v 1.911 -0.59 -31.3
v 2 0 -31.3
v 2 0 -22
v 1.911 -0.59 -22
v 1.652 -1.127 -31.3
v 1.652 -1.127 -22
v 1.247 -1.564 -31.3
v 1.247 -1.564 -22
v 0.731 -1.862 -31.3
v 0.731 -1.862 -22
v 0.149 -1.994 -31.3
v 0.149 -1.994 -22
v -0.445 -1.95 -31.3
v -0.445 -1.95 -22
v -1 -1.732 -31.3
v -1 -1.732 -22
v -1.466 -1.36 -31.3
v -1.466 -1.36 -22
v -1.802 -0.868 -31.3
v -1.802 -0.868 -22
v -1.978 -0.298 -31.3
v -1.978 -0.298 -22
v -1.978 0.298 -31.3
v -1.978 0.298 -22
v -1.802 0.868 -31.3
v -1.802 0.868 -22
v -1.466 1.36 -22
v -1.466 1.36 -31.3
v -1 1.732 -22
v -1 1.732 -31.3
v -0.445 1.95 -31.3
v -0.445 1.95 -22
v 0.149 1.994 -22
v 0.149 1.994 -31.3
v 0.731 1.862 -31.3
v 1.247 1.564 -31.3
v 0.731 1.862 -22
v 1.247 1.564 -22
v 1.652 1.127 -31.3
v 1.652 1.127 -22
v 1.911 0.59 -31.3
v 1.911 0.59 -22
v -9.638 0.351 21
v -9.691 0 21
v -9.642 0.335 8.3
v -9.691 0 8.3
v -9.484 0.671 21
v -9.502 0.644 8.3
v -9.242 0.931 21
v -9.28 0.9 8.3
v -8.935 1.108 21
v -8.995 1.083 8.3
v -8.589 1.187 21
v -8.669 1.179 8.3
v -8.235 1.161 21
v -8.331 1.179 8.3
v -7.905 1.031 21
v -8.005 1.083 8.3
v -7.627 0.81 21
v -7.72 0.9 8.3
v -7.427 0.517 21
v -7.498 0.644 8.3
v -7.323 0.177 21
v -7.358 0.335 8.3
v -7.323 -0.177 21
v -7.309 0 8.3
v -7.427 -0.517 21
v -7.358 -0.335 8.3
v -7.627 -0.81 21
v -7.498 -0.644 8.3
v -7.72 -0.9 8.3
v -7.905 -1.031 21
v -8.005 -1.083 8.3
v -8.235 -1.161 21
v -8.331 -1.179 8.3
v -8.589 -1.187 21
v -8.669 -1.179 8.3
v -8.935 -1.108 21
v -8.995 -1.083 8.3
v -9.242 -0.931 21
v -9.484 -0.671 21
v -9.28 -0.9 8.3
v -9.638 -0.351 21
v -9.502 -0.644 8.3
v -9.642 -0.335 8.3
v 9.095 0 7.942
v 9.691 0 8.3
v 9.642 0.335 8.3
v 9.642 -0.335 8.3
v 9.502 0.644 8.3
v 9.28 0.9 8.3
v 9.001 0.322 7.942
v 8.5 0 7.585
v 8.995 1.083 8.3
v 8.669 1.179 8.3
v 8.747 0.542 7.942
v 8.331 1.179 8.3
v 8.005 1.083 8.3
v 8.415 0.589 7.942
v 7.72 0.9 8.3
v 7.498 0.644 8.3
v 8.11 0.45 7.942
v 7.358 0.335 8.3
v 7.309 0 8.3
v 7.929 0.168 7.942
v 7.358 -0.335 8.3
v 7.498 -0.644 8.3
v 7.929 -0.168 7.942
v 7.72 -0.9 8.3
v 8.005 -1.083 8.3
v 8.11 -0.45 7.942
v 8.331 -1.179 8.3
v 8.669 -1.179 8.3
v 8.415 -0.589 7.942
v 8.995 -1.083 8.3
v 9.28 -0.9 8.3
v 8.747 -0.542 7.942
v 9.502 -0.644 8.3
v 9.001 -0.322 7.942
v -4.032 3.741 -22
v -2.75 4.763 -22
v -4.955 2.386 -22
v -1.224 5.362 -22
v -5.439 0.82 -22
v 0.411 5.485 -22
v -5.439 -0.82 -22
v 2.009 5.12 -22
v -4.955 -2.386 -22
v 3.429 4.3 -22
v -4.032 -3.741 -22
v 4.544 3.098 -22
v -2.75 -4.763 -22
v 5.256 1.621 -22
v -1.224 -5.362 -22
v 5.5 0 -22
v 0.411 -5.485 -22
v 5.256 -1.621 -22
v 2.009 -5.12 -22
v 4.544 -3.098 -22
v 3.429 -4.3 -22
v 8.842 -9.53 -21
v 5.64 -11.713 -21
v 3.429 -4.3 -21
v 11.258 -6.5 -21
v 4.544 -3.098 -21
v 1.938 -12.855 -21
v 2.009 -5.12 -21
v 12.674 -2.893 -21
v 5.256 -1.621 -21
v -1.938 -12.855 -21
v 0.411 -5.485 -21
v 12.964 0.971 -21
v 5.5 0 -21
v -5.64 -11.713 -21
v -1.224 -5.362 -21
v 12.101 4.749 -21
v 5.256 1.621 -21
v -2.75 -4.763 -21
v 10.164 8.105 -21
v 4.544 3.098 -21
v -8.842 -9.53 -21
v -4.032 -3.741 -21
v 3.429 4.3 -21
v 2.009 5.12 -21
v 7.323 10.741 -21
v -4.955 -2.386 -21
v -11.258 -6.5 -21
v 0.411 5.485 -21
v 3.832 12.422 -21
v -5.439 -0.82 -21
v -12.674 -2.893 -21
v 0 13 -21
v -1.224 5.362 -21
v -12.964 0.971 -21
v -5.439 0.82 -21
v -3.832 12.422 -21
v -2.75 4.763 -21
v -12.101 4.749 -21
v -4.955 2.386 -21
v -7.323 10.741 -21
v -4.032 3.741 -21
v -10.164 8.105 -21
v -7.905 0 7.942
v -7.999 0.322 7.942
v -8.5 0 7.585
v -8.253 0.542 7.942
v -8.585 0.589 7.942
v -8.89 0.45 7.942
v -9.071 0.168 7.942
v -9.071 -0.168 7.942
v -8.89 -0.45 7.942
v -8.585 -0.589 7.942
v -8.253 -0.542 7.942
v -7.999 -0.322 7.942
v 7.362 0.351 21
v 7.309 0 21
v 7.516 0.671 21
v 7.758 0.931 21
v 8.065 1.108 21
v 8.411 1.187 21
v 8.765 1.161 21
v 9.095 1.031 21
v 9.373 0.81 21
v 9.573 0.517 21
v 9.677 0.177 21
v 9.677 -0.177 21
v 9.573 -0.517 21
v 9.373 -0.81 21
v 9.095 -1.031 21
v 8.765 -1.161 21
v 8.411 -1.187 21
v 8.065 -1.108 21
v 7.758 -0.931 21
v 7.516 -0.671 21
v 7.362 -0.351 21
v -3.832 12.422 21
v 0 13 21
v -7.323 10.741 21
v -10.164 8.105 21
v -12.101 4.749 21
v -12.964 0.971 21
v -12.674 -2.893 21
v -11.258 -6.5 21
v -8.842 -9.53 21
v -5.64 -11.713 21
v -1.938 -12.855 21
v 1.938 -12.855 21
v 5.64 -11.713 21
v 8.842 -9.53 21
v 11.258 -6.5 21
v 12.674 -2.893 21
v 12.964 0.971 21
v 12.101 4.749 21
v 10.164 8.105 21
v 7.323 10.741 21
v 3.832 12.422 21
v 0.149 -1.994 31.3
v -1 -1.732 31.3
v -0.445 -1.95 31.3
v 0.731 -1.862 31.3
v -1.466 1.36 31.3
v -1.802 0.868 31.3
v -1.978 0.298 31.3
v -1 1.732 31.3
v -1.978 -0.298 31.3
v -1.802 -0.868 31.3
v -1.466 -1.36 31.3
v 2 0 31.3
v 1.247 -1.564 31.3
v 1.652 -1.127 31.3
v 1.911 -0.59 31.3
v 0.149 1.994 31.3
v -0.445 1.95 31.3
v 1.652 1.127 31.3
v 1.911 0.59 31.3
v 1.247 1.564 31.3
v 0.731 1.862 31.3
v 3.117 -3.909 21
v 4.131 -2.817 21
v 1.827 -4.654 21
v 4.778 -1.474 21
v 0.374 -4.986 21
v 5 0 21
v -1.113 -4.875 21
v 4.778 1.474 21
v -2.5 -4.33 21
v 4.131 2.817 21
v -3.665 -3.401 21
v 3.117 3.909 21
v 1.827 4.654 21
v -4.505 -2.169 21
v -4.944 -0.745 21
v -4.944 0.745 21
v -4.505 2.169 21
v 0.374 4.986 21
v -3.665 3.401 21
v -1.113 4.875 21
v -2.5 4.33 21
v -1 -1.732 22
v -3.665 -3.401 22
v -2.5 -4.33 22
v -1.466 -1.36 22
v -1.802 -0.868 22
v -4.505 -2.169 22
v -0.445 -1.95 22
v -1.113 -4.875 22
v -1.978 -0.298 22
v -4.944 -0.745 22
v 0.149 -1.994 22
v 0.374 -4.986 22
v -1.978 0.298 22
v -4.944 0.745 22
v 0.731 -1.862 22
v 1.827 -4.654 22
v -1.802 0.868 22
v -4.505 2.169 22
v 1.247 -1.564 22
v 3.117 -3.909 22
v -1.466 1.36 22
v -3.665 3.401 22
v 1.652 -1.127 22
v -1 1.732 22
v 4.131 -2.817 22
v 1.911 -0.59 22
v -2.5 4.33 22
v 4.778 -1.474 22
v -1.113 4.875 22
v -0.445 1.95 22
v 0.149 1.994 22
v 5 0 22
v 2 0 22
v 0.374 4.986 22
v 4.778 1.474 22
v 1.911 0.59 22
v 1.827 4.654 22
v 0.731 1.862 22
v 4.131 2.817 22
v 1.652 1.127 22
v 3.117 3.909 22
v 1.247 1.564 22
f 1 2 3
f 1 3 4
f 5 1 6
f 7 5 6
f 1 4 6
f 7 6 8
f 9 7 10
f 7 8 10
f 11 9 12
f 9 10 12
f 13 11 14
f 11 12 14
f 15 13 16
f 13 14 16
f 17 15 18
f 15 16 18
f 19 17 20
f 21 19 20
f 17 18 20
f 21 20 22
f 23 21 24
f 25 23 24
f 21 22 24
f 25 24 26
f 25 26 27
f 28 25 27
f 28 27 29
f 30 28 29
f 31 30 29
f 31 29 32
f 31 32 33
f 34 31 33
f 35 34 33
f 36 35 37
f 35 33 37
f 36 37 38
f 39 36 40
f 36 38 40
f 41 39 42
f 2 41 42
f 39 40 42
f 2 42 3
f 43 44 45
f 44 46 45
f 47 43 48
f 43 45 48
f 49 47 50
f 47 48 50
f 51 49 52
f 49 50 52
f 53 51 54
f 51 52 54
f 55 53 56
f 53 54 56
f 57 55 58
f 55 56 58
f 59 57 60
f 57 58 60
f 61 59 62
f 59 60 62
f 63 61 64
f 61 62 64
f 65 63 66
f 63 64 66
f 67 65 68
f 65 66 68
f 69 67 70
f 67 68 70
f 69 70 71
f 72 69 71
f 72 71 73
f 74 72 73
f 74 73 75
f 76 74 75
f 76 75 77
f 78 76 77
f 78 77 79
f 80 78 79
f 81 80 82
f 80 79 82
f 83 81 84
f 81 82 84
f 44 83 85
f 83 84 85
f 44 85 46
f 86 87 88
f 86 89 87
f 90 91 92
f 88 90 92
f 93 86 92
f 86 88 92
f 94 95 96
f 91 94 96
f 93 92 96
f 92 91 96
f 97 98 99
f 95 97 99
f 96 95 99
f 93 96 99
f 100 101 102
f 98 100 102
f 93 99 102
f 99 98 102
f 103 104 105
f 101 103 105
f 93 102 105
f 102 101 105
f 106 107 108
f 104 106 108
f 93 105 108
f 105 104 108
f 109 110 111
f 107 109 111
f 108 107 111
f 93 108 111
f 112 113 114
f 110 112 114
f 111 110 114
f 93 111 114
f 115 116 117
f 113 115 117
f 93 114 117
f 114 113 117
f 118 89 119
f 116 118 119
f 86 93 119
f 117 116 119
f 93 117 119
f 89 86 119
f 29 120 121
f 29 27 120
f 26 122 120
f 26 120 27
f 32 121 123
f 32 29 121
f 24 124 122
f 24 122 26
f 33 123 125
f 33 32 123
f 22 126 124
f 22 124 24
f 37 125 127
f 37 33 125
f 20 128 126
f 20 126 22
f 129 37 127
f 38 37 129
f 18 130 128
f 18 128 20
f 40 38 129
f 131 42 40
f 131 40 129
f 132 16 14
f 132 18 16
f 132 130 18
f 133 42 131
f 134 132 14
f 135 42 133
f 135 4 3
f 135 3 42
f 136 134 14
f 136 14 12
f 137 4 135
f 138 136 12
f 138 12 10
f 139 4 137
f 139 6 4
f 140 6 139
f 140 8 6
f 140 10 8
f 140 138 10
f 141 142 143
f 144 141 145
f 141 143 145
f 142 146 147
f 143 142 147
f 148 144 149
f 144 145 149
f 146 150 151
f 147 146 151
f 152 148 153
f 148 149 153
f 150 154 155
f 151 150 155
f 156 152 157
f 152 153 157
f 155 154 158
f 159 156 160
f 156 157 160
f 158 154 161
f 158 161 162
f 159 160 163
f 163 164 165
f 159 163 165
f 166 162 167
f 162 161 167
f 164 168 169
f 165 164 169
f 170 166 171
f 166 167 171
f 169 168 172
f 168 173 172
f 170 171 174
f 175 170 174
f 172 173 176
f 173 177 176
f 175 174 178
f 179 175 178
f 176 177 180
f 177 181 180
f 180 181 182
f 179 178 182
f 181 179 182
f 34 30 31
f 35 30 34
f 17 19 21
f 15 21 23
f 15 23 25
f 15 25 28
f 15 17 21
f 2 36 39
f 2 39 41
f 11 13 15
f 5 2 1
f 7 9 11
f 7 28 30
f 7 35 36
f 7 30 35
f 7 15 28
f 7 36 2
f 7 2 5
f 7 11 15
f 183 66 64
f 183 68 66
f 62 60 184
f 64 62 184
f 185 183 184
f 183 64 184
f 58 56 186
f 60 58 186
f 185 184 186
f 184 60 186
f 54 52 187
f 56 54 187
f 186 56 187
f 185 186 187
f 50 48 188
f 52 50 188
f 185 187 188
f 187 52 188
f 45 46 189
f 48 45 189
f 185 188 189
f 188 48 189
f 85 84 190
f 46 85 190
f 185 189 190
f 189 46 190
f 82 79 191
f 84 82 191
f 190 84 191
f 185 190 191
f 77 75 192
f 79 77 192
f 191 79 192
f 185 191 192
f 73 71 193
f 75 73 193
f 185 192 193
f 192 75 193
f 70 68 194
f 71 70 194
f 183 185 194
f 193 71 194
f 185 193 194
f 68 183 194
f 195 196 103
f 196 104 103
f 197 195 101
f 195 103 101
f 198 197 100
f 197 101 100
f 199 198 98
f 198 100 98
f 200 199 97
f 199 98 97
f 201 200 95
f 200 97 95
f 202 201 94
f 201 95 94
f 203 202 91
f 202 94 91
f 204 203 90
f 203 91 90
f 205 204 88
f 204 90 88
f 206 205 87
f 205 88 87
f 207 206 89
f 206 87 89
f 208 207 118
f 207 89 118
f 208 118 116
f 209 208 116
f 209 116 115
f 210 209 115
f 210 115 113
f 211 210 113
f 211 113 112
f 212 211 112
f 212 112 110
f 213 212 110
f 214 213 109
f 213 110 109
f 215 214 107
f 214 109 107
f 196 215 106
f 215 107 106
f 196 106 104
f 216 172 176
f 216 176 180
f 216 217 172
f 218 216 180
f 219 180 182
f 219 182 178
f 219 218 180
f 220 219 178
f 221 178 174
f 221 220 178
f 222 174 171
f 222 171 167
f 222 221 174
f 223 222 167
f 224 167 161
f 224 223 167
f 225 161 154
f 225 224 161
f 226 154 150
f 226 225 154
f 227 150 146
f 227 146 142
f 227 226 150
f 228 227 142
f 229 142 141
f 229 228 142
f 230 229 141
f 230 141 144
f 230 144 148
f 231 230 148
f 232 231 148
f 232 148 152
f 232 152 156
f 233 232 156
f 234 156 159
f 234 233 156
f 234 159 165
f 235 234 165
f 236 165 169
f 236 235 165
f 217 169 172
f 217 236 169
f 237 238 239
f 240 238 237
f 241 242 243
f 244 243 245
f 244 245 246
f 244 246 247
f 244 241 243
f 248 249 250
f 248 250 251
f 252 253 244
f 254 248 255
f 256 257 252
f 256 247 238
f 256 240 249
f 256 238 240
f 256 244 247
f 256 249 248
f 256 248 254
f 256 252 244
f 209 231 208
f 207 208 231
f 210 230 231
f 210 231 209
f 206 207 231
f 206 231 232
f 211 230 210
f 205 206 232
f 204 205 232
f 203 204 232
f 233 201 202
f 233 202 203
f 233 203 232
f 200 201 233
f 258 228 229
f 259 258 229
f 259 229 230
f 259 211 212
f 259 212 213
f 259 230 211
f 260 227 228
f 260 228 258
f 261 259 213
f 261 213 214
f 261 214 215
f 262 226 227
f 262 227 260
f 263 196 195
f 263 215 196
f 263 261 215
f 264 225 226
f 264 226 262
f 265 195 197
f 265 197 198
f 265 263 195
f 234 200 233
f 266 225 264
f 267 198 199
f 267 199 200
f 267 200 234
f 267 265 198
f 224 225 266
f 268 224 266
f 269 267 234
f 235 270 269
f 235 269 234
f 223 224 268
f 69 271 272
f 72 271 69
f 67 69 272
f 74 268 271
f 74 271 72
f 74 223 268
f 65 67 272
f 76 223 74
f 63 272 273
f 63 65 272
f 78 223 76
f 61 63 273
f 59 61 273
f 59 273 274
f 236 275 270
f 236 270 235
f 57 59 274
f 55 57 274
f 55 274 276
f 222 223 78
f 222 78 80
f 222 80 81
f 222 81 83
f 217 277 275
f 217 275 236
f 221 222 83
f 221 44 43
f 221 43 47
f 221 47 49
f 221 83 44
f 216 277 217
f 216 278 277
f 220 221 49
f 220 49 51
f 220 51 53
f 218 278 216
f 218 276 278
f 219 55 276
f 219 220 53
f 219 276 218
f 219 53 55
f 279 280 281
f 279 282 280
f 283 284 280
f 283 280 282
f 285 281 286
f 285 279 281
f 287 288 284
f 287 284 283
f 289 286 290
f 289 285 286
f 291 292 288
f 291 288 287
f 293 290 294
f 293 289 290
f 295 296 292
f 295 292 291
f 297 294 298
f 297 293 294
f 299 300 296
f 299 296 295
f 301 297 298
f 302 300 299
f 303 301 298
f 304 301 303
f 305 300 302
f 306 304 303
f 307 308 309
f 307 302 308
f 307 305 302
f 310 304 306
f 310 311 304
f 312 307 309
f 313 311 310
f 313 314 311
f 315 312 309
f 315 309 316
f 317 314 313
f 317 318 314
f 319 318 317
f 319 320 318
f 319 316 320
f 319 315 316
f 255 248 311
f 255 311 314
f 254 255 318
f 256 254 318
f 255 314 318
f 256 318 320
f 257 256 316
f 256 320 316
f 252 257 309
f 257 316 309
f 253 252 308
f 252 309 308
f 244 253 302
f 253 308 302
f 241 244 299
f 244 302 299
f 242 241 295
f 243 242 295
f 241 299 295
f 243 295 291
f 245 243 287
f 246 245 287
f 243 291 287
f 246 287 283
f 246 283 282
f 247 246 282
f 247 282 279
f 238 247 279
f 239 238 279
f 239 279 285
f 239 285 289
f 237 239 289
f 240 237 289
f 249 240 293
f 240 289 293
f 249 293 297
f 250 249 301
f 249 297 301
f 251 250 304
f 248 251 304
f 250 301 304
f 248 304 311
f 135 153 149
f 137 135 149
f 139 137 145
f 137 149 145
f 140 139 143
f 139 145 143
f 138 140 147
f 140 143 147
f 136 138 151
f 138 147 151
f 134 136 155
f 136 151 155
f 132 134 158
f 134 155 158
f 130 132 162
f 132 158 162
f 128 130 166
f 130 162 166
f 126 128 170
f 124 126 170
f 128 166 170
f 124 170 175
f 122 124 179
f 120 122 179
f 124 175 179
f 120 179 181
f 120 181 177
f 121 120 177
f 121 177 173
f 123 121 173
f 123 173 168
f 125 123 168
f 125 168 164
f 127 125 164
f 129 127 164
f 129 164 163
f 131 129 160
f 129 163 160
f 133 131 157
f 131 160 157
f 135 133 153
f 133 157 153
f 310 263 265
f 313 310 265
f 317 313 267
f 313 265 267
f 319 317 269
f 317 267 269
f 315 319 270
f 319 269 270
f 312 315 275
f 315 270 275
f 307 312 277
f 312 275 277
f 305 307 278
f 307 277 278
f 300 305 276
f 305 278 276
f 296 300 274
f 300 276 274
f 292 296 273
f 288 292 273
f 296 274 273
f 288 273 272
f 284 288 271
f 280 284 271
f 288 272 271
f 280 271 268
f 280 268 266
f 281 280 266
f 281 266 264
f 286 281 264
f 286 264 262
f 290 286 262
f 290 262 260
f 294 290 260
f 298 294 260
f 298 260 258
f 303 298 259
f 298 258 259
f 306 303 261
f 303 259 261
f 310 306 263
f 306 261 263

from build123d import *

# Parameters (mm, degrees)
SKETCH1_R                           = 13
BOSS_EXTRUDE1_DEPTH                 = 21
SKETCH2_R                           = 5
BOSS_EXTRUDE2_DEPTH                 = 1
SKETCH4_R                           = 5.5
BOSS_EXTRUDE4_DEPTH                 = 1
SKETCH3_R                           = 2
BOSS_EXTRUDE5_DEPTH                 = 9.3
SKETCH5_R                           = 2
BOSS_EXTRUDE6_DEPTH                 = 9.3
F_3_32_0_09375_DIAMETER_HOLE1_D     = 2.38125
F_3_32_0_09375_DIAMETER_HOLE1_DEPTH = 12.7
F_3_32_0_09375_DIAMETER_HOLE1_TIP   = 0.715399675


with BuildPart() as part:
    # Sketch1 → Boss-Extrude1 (new body, symmetric)
    with BuildSketch(Plane(origin=(0, 0, 0), x_dir=(0, 1, 0), z_dir=(0, 0, 1))):
        Circle(SKETCH1_R)
    extrude(amount=BOSS_EXTRUDE1_DEPTH, both=True)

    # Sketch2 → Boss-Extrude2 (add)
    with BuildSketch(Plane.XY.offset(21)):
        Circle(SKETCH2_R)
    extrude(amount=BOSS_EXTRUDE2_DEPTH)

    # Sketch4 → Boss-Extrude4 (add)
    with BuildSketch(Plane(origin=(0, 0, -21), x_dir=(1, 0, 0), z_dir=(0, 0, -1))):
        Circle(SKETCH4_R)
    extrude(amount=BOSS_EXTRUDE4_DEPTH)

    # Sketch3 → Boss-Extrude5 (add)
    with BuildSketch(Plane.XY.offset(22)):
        Circle(SKETCH3_R)
    extrude(amount=BOSS_EXTRUDE5_DEPTH)

    # Sketch5 → Boss-Extrude6 (add)
    with BuildSketch(Plane(origin=(0, 0, -22), x_dir=(1, 0, 0), z_dir=(0, 0, -1))):
        Circle(SKETCH5_R)
    extrude(amount=BOSS_EXTRUDE6_DEPTH)

    # 3/32 (0.09375) Diameter Hole1
    with Locations(Plane.XY.offset(21)):
        with Locations((8.5, 0), (-8.5, 0)):
            Hole(F_3_32_0_09375_DIAMETER_HOLE1_D / 2, depth=F_3_32_0_09375_DIAMETER_HOLE1_DEPTH)
            with Locations((0, 0, -(F_3_32_0_09375_DIAMETER_HOLE1_DEPTH + F_3_32_0_09375_DIAMETER_HOLE1_TIP / 2))):  # 118° drill point
                Cone(0, F_3_32_0_09375_DIAMETER_HOLE1_D / 2, F_3_32_0_09375_DIAMETER_HOLE1_TIP, mode=Mode.SUBTRACT)


solid = part.part
